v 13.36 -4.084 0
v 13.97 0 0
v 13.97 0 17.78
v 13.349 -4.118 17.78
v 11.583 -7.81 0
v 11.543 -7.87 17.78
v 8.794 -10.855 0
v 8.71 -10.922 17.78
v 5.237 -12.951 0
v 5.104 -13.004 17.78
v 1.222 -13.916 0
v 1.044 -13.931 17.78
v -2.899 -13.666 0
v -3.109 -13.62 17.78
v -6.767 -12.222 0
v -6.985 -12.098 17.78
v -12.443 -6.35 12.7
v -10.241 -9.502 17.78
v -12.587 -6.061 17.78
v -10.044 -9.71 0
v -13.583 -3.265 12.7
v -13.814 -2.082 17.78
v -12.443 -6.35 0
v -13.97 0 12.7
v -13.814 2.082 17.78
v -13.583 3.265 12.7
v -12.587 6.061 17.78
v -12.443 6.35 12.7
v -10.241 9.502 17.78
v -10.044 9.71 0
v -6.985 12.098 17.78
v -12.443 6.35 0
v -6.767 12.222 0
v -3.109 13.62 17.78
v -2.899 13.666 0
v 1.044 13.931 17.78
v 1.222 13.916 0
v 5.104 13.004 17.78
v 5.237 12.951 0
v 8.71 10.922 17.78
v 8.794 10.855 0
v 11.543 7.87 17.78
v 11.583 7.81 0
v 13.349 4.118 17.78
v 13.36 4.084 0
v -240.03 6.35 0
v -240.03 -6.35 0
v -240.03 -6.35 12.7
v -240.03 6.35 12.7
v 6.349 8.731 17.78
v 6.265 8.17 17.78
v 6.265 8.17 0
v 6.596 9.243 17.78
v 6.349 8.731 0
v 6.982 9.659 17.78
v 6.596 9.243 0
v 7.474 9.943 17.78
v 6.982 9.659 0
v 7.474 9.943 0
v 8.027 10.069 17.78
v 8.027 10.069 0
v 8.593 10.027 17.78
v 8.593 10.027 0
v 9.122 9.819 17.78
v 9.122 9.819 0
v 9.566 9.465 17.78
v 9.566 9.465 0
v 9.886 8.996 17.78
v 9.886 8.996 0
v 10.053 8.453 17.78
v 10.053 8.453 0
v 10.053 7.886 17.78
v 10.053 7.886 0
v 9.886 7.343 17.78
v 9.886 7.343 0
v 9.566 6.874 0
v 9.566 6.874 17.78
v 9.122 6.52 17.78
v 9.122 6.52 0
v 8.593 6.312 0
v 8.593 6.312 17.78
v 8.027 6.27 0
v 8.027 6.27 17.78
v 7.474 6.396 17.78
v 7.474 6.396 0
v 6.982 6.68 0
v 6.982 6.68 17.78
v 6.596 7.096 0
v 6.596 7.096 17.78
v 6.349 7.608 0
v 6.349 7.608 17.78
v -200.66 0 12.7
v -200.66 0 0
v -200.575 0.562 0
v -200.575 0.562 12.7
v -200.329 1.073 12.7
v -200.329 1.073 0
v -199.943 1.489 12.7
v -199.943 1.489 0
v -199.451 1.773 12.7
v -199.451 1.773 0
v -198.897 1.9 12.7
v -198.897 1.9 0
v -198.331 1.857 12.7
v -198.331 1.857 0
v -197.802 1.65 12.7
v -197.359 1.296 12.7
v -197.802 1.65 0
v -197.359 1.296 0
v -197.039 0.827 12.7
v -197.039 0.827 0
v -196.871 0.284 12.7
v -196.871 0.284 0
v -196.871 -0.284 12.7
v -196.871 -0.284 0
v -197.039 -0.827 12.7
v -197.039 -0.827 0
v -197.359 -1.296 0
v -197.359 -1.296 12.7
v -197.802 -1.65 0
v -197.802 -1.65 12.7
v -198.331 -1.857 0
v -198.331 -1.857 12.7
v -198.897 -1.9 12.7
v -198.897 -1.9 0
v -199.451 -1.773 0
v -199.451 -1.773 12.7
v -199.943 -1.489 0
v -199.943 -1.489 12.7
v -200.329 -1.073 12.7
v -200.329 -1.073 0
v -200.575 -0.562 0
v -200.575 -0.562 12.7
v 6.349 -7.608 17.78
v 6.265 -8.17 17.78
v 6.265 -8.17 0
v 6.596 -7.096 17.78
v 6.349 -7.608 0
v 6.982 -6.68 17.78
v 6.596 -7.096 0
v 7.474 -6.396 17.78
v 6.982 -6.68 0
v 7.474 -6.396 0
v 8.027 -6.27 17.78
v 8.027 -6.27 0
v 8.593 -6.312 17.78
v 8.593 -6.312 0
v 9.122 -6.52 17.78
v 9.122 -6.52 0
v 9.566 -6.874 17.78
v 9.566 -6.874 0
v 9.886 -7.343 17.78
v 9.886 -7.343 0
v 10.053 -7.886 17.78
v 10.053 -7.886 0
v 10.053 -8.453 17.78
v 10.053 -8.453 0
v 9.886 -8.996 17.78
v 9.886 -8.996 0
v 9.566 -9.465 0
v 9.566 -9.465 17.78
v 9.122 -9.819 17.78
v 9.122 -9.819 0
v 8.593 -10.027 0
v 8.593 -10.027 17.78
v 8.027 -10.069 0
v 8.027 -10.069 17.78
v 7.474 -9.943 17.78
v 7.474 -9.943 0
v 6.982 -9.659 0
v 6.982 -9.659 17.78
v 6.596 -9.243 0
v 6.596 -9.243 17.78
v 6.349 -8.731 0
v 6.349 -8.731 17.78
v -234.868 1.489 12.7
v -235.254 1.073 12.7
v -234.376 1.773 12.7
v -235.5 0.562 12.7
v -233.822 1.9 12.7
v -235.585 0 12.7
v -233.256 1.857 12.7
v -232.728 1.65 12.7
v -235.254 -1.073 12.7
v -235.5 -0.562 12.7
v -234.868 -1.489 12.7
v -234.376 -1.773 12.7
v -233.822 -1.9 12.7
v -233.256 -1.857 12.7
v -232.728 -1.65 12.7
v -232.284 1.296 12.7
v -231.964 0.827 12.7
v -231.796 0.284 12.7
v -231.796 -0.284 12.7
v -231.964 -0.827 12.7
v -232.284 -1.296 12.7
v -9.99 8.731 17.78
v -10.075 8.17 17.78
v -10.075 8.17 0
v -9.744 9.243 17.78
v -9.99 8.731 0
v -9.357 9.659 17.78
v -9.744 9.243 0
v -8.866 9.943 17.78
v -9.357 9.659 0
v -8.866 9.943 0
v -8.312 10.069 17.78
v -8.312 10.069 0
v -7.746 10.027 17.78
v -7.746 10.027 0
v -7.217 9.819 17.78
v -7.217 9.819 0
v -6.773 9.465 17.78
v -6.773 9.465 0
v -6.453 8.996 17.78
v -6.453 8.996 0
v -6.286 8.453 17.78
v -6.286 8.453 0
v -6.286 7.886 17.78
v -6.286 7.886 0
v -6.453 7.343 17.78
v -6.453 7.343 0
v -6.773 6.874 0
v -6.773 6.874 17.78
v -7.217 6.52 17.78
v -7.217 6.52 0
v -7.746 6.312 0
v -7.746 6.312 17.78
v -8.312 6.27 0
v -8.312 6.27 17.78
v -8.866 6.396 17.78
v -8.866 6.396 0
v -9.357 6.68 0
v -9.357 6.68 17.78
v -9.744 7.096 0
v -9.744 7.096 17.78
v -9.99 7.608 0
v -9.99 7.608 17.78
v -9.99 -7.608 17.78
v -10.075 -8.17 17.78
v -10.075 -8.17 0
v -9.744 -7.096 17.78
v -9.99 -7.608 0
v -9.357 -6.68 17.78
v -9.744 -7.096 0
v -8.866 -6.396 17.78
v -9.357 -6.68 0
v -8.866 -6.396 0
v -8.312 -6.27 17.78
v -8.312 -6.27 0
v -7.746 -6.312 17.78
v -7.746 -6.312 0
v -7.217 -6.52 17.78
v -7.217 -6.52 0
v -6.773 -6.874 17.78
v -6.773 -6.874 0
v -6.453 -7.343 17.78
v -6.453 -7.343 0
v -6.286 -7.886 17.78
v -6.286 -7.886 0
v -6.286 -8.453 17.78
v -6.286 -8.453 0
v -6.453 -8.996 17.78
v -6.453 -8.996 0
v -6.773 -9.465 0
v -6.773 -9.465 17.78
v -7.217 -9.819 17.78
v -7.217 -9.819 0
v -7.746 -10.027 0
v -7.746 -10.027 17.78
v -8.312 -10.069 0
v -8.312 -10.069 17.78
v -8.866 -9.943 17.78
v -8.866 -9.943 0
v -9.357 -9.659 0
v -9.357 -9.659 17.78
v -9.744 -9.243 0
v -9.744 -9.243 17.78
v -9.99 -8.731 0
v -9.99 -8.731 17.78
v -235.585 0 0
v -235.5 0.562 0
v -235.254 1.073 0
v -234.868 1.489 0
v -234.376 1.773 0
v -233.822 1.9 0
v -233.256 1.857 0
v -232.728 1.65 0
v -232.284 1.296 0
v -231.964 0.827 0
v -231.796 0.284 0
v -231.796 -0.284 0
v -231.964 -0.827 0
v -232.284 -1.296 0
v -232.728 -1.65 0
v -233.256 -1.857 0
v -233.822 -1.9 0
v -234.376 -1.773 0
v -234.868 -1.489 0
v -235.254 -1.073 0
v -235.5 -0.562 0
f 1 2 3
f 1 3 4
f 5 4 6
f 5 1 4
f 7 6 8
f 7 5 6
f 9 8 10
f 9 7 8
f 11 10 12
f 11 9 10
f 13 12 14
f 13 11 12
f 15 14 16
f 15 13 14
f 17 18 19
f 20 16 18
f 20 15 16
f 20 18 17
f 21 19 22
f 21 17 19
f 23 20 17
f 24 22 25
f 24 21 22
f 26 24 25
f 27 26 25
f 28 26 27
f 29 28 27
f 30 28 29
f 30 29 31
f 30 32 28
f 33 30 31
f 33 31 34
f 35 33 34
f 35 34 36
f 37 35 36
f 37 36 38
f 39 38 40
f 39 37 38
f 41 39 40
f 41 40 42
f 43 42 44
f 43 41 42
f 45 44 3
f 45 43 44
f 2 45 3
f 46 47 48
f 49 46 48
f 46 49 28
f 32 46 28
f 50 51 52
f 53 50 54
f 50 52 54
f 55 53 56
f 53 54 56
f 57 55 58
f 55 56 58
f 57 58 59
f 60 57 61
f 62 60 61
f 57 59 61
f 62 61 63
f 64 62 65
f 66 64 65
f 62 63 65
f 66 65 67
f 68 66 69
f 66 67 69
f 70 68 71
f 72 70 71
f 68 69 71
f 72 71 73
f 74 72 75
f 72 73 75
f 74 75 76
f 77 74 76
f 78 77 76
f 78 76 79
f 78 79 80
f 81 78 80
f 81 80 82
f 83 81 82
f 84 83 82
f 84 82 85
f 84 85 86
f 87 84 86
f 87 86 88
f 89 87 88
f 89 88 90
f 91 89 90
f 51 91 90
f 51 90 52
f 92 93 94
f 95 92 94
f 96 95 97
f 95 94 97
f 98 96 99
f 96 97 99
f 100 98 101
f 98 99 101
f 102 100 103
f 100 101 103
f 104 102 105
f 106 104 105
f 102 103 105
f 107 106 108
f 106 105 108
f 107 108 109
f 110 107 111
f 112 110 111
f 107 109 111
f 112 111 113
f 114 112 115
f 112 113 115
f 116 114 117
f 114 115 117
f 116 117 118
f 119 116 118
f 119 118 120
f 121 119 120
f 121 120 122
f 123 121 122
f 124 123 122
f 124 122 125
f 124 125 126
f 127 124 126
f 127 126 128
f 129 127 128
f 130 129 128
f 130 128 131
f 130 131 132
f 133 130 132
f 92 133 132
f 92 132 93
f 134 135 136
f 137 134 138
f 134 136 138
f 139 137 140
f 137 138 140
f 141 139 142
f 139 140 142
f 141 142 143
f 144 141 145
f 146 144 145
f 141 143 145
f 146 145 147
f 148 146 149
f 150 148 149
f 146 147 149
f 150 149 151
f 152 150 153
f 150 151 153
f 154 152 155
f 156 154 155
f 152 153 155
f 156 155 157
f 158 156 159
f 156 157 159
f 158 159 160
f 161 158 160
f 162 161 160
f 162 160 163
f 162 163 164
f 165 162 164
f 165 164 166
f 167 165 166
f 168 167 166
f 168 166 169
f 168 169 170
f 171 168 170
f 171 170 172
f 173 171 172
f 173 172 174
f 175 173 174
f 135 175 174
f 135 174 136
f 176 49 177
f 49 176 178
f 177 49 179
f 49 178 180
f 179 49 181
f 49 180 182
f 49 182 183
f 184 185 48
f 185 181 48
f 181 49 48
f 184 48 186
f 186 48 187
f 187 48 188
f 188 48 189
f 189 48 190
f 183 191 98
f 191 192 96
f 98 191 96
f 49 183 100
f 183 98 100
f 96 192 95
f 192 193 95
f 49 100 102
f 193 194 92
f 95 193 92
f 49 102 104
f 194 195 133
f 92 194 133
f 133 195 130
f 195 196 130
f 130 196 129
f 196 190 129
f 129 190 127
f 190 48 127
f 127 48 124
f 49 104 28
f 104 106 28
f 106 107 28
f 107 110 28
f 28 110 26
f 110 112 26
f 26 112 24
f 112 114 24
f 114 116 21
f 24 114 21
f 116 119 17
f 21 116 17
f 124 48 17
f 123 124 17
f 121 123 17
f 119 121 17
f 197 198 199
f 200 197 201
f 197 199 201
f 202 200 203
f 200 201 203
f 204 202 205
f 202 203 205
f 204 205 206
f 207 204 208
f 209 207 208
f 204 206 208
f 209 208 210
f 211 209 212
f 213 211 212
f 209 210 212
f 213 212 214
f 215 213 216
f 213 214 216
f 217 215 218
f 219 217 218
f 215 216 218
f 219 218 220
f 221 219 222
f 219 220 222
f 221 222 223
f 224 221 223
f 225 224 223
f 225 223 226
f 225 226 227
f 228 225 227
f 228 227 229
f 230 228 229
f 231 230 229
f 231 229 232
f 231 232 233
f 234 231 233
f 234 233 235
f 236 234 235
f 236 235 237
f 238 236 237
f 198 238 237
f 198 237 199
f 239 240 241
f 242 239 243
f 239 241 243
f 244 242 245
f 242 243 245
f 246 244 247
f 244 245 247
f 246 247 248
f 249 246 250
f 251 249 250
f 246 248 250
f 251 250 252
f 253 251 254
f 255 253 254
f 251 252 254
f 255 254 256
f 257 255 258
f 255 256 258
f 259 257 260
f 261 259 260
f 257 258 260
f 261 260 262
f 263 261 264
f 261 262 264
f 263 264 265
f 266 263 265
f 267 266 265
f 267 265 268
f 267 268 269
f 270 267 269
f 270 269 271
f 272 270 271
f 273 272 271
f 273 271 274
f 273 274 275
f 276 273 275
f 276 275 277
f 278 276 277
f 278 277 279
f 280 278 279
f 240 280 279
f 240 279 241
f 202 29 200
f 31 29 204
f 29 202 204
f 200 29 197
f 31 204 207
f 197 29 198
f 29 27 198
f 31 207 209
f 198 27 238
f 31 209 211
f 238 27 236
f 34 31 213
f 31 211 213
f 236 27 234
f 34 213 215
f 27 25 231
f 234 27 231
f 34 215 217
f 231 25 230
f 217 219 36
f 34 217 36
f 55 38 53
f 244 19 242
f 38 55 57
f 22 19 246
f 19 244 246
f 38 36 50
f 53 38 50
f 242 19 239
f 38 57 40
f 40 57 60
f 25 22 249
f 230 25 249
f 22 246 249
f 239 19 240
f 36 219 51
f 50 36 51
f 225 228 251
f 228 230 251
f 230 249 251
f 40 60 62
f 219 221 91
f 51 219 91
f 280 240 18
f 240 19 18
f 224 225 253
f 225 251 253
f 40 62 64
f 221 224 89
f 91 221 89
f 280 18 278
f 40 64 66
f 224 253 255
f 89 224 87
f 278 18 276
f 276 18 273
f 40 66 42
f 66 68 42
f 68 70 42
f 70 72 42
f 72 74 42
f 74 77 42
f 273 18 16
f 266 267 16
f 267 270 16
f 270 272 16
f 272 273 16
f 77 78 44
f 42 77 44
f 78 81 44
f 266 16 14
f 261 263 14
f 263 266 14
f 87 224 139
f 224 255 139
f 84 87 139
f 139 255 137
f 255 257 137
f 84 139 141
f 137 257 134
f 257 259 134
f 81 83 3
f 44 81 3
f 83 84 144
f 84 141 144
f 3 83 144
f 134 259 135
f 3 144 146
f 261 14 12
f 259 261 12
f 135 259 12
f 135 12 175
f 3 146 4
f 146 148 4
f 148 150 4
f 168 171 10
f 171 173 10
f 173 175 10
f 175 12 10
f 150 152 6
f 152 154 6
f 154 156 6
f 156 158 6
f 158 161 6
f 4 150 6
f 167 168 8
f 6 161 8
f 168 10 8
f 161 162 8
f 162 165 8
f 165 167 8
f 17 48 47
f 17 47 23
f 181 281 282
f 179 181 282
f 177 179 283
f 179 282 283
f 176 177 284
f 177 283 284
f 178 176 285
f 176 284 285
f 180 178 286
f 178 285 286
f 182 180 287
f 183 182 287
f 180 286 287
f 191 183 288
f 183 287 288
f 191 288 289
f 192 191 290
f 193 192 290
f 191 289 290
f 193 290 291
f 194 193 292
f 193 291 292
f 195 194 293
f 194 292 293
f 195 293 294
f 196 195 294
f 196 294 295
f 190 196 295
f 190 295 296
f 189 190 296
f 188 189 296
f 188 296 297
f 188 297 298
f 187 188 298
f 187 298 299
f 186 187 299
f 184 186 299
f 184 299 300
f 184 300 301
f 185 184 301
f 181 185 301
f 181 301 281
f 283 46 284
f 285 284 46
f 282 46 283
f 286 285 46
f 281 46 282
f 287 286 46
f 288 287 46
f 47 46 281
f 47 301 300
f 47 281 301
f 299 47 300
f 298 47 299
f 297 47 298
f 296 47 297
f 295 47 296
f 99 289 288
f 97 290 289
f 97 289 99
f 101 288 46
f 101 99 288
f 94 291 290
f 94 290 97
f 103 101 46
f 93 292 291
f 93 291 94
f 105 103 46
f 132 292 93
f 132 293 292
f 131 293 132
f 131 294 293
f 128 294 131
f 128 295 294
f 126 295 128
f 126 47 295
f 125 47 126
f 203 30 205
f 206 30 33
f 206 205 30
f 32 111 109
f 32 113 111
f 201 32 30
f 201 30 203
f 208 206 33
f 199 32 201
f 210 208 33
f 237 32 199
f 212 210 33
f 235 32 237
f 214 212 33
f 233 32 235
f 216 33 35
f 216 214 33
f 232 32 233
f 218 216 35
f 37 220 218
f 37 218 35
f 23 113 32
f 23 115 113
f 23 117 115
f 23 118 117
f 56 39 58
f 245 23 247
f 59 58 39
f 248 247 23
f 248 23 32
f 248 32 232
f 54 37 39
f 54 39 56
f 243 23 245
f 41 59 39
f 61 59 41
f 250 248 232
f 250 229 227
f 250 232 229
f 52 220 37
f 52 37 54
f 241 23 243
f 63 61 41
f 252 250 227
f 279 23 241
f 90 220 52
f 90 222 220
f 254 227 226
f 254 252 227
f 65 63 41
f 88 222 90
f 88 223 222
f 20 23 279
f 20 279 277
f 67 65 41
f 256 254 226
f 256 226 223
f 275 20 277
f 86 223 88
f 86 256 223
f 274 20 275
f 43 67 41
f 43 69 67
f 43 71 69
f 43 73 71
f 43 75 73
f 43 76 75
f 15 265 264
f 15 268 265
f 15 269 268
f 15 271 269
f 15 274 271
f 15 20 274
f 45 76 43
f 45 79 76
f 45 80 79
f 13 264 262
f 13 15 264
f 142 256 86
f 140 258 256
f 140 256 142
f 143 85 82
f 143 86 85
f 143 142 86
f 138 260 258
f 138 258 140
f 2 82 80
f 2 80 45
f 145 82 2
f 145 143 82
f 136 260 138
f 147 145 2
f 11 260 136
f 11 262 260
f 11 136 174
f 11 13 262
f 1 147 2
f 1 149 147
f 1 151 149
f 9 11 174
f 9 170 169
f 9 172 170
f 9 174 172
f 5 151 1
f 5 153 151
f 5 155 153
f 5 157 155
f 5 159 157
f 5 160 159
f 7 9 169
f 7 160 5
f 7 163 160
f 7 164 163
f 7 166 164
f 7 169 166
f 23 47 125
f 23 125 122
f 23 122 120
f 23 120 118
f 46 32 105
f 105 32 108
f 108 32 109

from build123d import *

# Parameters (mm, degrees)
F0_W          = 240.03
F0_H          = 12.7
F1_DEPTH      = 6.35
F1_DEPTH_BACK = 6.35
F2_R          = 13.97
F3_DEPTH      = 17.78
F5_D          = 3.81
F7_D          = 3.81


with BuildPart() as f1:
    # F0 (on Front) → F1 (new body, two sides)
    with BuildSketch(Plane.XZ) as f1_sk:
        with Locations((-120.015, 6.35)):
            Rectangle(F0_W, F0_H)
    extrude(amount=F1_DEPTH)
    extrude(f1_sk.sketch, amount=-F1_DEPTH_BACK)

    # F2 (on face) → F3 (join)
    with BuildSketch(Plane(origin=(0, 0, 0), x_dir=(1, 0, 0), z_dir=(0, 0, -1))):
        Circle(F2_R)
    extrude(amount=-F3_DEPTH)

    # F5 (through all)
    with Locations(Plane.XY.offset(12.7)):
        with Locations((-233.68, 0), (-198.755, 0)):
            Hole(F5_D / 2)

    # F7 (through all)
    with Locations(Plane.XY.offset(17.78)):
        with Locations((-8.169546, 8.169546), (8.169546, 8.169546), (8.169546, -8.169546), (-8.169546, -8.169546)):
            Hole(F7_D / 2)


solid = f1.part
